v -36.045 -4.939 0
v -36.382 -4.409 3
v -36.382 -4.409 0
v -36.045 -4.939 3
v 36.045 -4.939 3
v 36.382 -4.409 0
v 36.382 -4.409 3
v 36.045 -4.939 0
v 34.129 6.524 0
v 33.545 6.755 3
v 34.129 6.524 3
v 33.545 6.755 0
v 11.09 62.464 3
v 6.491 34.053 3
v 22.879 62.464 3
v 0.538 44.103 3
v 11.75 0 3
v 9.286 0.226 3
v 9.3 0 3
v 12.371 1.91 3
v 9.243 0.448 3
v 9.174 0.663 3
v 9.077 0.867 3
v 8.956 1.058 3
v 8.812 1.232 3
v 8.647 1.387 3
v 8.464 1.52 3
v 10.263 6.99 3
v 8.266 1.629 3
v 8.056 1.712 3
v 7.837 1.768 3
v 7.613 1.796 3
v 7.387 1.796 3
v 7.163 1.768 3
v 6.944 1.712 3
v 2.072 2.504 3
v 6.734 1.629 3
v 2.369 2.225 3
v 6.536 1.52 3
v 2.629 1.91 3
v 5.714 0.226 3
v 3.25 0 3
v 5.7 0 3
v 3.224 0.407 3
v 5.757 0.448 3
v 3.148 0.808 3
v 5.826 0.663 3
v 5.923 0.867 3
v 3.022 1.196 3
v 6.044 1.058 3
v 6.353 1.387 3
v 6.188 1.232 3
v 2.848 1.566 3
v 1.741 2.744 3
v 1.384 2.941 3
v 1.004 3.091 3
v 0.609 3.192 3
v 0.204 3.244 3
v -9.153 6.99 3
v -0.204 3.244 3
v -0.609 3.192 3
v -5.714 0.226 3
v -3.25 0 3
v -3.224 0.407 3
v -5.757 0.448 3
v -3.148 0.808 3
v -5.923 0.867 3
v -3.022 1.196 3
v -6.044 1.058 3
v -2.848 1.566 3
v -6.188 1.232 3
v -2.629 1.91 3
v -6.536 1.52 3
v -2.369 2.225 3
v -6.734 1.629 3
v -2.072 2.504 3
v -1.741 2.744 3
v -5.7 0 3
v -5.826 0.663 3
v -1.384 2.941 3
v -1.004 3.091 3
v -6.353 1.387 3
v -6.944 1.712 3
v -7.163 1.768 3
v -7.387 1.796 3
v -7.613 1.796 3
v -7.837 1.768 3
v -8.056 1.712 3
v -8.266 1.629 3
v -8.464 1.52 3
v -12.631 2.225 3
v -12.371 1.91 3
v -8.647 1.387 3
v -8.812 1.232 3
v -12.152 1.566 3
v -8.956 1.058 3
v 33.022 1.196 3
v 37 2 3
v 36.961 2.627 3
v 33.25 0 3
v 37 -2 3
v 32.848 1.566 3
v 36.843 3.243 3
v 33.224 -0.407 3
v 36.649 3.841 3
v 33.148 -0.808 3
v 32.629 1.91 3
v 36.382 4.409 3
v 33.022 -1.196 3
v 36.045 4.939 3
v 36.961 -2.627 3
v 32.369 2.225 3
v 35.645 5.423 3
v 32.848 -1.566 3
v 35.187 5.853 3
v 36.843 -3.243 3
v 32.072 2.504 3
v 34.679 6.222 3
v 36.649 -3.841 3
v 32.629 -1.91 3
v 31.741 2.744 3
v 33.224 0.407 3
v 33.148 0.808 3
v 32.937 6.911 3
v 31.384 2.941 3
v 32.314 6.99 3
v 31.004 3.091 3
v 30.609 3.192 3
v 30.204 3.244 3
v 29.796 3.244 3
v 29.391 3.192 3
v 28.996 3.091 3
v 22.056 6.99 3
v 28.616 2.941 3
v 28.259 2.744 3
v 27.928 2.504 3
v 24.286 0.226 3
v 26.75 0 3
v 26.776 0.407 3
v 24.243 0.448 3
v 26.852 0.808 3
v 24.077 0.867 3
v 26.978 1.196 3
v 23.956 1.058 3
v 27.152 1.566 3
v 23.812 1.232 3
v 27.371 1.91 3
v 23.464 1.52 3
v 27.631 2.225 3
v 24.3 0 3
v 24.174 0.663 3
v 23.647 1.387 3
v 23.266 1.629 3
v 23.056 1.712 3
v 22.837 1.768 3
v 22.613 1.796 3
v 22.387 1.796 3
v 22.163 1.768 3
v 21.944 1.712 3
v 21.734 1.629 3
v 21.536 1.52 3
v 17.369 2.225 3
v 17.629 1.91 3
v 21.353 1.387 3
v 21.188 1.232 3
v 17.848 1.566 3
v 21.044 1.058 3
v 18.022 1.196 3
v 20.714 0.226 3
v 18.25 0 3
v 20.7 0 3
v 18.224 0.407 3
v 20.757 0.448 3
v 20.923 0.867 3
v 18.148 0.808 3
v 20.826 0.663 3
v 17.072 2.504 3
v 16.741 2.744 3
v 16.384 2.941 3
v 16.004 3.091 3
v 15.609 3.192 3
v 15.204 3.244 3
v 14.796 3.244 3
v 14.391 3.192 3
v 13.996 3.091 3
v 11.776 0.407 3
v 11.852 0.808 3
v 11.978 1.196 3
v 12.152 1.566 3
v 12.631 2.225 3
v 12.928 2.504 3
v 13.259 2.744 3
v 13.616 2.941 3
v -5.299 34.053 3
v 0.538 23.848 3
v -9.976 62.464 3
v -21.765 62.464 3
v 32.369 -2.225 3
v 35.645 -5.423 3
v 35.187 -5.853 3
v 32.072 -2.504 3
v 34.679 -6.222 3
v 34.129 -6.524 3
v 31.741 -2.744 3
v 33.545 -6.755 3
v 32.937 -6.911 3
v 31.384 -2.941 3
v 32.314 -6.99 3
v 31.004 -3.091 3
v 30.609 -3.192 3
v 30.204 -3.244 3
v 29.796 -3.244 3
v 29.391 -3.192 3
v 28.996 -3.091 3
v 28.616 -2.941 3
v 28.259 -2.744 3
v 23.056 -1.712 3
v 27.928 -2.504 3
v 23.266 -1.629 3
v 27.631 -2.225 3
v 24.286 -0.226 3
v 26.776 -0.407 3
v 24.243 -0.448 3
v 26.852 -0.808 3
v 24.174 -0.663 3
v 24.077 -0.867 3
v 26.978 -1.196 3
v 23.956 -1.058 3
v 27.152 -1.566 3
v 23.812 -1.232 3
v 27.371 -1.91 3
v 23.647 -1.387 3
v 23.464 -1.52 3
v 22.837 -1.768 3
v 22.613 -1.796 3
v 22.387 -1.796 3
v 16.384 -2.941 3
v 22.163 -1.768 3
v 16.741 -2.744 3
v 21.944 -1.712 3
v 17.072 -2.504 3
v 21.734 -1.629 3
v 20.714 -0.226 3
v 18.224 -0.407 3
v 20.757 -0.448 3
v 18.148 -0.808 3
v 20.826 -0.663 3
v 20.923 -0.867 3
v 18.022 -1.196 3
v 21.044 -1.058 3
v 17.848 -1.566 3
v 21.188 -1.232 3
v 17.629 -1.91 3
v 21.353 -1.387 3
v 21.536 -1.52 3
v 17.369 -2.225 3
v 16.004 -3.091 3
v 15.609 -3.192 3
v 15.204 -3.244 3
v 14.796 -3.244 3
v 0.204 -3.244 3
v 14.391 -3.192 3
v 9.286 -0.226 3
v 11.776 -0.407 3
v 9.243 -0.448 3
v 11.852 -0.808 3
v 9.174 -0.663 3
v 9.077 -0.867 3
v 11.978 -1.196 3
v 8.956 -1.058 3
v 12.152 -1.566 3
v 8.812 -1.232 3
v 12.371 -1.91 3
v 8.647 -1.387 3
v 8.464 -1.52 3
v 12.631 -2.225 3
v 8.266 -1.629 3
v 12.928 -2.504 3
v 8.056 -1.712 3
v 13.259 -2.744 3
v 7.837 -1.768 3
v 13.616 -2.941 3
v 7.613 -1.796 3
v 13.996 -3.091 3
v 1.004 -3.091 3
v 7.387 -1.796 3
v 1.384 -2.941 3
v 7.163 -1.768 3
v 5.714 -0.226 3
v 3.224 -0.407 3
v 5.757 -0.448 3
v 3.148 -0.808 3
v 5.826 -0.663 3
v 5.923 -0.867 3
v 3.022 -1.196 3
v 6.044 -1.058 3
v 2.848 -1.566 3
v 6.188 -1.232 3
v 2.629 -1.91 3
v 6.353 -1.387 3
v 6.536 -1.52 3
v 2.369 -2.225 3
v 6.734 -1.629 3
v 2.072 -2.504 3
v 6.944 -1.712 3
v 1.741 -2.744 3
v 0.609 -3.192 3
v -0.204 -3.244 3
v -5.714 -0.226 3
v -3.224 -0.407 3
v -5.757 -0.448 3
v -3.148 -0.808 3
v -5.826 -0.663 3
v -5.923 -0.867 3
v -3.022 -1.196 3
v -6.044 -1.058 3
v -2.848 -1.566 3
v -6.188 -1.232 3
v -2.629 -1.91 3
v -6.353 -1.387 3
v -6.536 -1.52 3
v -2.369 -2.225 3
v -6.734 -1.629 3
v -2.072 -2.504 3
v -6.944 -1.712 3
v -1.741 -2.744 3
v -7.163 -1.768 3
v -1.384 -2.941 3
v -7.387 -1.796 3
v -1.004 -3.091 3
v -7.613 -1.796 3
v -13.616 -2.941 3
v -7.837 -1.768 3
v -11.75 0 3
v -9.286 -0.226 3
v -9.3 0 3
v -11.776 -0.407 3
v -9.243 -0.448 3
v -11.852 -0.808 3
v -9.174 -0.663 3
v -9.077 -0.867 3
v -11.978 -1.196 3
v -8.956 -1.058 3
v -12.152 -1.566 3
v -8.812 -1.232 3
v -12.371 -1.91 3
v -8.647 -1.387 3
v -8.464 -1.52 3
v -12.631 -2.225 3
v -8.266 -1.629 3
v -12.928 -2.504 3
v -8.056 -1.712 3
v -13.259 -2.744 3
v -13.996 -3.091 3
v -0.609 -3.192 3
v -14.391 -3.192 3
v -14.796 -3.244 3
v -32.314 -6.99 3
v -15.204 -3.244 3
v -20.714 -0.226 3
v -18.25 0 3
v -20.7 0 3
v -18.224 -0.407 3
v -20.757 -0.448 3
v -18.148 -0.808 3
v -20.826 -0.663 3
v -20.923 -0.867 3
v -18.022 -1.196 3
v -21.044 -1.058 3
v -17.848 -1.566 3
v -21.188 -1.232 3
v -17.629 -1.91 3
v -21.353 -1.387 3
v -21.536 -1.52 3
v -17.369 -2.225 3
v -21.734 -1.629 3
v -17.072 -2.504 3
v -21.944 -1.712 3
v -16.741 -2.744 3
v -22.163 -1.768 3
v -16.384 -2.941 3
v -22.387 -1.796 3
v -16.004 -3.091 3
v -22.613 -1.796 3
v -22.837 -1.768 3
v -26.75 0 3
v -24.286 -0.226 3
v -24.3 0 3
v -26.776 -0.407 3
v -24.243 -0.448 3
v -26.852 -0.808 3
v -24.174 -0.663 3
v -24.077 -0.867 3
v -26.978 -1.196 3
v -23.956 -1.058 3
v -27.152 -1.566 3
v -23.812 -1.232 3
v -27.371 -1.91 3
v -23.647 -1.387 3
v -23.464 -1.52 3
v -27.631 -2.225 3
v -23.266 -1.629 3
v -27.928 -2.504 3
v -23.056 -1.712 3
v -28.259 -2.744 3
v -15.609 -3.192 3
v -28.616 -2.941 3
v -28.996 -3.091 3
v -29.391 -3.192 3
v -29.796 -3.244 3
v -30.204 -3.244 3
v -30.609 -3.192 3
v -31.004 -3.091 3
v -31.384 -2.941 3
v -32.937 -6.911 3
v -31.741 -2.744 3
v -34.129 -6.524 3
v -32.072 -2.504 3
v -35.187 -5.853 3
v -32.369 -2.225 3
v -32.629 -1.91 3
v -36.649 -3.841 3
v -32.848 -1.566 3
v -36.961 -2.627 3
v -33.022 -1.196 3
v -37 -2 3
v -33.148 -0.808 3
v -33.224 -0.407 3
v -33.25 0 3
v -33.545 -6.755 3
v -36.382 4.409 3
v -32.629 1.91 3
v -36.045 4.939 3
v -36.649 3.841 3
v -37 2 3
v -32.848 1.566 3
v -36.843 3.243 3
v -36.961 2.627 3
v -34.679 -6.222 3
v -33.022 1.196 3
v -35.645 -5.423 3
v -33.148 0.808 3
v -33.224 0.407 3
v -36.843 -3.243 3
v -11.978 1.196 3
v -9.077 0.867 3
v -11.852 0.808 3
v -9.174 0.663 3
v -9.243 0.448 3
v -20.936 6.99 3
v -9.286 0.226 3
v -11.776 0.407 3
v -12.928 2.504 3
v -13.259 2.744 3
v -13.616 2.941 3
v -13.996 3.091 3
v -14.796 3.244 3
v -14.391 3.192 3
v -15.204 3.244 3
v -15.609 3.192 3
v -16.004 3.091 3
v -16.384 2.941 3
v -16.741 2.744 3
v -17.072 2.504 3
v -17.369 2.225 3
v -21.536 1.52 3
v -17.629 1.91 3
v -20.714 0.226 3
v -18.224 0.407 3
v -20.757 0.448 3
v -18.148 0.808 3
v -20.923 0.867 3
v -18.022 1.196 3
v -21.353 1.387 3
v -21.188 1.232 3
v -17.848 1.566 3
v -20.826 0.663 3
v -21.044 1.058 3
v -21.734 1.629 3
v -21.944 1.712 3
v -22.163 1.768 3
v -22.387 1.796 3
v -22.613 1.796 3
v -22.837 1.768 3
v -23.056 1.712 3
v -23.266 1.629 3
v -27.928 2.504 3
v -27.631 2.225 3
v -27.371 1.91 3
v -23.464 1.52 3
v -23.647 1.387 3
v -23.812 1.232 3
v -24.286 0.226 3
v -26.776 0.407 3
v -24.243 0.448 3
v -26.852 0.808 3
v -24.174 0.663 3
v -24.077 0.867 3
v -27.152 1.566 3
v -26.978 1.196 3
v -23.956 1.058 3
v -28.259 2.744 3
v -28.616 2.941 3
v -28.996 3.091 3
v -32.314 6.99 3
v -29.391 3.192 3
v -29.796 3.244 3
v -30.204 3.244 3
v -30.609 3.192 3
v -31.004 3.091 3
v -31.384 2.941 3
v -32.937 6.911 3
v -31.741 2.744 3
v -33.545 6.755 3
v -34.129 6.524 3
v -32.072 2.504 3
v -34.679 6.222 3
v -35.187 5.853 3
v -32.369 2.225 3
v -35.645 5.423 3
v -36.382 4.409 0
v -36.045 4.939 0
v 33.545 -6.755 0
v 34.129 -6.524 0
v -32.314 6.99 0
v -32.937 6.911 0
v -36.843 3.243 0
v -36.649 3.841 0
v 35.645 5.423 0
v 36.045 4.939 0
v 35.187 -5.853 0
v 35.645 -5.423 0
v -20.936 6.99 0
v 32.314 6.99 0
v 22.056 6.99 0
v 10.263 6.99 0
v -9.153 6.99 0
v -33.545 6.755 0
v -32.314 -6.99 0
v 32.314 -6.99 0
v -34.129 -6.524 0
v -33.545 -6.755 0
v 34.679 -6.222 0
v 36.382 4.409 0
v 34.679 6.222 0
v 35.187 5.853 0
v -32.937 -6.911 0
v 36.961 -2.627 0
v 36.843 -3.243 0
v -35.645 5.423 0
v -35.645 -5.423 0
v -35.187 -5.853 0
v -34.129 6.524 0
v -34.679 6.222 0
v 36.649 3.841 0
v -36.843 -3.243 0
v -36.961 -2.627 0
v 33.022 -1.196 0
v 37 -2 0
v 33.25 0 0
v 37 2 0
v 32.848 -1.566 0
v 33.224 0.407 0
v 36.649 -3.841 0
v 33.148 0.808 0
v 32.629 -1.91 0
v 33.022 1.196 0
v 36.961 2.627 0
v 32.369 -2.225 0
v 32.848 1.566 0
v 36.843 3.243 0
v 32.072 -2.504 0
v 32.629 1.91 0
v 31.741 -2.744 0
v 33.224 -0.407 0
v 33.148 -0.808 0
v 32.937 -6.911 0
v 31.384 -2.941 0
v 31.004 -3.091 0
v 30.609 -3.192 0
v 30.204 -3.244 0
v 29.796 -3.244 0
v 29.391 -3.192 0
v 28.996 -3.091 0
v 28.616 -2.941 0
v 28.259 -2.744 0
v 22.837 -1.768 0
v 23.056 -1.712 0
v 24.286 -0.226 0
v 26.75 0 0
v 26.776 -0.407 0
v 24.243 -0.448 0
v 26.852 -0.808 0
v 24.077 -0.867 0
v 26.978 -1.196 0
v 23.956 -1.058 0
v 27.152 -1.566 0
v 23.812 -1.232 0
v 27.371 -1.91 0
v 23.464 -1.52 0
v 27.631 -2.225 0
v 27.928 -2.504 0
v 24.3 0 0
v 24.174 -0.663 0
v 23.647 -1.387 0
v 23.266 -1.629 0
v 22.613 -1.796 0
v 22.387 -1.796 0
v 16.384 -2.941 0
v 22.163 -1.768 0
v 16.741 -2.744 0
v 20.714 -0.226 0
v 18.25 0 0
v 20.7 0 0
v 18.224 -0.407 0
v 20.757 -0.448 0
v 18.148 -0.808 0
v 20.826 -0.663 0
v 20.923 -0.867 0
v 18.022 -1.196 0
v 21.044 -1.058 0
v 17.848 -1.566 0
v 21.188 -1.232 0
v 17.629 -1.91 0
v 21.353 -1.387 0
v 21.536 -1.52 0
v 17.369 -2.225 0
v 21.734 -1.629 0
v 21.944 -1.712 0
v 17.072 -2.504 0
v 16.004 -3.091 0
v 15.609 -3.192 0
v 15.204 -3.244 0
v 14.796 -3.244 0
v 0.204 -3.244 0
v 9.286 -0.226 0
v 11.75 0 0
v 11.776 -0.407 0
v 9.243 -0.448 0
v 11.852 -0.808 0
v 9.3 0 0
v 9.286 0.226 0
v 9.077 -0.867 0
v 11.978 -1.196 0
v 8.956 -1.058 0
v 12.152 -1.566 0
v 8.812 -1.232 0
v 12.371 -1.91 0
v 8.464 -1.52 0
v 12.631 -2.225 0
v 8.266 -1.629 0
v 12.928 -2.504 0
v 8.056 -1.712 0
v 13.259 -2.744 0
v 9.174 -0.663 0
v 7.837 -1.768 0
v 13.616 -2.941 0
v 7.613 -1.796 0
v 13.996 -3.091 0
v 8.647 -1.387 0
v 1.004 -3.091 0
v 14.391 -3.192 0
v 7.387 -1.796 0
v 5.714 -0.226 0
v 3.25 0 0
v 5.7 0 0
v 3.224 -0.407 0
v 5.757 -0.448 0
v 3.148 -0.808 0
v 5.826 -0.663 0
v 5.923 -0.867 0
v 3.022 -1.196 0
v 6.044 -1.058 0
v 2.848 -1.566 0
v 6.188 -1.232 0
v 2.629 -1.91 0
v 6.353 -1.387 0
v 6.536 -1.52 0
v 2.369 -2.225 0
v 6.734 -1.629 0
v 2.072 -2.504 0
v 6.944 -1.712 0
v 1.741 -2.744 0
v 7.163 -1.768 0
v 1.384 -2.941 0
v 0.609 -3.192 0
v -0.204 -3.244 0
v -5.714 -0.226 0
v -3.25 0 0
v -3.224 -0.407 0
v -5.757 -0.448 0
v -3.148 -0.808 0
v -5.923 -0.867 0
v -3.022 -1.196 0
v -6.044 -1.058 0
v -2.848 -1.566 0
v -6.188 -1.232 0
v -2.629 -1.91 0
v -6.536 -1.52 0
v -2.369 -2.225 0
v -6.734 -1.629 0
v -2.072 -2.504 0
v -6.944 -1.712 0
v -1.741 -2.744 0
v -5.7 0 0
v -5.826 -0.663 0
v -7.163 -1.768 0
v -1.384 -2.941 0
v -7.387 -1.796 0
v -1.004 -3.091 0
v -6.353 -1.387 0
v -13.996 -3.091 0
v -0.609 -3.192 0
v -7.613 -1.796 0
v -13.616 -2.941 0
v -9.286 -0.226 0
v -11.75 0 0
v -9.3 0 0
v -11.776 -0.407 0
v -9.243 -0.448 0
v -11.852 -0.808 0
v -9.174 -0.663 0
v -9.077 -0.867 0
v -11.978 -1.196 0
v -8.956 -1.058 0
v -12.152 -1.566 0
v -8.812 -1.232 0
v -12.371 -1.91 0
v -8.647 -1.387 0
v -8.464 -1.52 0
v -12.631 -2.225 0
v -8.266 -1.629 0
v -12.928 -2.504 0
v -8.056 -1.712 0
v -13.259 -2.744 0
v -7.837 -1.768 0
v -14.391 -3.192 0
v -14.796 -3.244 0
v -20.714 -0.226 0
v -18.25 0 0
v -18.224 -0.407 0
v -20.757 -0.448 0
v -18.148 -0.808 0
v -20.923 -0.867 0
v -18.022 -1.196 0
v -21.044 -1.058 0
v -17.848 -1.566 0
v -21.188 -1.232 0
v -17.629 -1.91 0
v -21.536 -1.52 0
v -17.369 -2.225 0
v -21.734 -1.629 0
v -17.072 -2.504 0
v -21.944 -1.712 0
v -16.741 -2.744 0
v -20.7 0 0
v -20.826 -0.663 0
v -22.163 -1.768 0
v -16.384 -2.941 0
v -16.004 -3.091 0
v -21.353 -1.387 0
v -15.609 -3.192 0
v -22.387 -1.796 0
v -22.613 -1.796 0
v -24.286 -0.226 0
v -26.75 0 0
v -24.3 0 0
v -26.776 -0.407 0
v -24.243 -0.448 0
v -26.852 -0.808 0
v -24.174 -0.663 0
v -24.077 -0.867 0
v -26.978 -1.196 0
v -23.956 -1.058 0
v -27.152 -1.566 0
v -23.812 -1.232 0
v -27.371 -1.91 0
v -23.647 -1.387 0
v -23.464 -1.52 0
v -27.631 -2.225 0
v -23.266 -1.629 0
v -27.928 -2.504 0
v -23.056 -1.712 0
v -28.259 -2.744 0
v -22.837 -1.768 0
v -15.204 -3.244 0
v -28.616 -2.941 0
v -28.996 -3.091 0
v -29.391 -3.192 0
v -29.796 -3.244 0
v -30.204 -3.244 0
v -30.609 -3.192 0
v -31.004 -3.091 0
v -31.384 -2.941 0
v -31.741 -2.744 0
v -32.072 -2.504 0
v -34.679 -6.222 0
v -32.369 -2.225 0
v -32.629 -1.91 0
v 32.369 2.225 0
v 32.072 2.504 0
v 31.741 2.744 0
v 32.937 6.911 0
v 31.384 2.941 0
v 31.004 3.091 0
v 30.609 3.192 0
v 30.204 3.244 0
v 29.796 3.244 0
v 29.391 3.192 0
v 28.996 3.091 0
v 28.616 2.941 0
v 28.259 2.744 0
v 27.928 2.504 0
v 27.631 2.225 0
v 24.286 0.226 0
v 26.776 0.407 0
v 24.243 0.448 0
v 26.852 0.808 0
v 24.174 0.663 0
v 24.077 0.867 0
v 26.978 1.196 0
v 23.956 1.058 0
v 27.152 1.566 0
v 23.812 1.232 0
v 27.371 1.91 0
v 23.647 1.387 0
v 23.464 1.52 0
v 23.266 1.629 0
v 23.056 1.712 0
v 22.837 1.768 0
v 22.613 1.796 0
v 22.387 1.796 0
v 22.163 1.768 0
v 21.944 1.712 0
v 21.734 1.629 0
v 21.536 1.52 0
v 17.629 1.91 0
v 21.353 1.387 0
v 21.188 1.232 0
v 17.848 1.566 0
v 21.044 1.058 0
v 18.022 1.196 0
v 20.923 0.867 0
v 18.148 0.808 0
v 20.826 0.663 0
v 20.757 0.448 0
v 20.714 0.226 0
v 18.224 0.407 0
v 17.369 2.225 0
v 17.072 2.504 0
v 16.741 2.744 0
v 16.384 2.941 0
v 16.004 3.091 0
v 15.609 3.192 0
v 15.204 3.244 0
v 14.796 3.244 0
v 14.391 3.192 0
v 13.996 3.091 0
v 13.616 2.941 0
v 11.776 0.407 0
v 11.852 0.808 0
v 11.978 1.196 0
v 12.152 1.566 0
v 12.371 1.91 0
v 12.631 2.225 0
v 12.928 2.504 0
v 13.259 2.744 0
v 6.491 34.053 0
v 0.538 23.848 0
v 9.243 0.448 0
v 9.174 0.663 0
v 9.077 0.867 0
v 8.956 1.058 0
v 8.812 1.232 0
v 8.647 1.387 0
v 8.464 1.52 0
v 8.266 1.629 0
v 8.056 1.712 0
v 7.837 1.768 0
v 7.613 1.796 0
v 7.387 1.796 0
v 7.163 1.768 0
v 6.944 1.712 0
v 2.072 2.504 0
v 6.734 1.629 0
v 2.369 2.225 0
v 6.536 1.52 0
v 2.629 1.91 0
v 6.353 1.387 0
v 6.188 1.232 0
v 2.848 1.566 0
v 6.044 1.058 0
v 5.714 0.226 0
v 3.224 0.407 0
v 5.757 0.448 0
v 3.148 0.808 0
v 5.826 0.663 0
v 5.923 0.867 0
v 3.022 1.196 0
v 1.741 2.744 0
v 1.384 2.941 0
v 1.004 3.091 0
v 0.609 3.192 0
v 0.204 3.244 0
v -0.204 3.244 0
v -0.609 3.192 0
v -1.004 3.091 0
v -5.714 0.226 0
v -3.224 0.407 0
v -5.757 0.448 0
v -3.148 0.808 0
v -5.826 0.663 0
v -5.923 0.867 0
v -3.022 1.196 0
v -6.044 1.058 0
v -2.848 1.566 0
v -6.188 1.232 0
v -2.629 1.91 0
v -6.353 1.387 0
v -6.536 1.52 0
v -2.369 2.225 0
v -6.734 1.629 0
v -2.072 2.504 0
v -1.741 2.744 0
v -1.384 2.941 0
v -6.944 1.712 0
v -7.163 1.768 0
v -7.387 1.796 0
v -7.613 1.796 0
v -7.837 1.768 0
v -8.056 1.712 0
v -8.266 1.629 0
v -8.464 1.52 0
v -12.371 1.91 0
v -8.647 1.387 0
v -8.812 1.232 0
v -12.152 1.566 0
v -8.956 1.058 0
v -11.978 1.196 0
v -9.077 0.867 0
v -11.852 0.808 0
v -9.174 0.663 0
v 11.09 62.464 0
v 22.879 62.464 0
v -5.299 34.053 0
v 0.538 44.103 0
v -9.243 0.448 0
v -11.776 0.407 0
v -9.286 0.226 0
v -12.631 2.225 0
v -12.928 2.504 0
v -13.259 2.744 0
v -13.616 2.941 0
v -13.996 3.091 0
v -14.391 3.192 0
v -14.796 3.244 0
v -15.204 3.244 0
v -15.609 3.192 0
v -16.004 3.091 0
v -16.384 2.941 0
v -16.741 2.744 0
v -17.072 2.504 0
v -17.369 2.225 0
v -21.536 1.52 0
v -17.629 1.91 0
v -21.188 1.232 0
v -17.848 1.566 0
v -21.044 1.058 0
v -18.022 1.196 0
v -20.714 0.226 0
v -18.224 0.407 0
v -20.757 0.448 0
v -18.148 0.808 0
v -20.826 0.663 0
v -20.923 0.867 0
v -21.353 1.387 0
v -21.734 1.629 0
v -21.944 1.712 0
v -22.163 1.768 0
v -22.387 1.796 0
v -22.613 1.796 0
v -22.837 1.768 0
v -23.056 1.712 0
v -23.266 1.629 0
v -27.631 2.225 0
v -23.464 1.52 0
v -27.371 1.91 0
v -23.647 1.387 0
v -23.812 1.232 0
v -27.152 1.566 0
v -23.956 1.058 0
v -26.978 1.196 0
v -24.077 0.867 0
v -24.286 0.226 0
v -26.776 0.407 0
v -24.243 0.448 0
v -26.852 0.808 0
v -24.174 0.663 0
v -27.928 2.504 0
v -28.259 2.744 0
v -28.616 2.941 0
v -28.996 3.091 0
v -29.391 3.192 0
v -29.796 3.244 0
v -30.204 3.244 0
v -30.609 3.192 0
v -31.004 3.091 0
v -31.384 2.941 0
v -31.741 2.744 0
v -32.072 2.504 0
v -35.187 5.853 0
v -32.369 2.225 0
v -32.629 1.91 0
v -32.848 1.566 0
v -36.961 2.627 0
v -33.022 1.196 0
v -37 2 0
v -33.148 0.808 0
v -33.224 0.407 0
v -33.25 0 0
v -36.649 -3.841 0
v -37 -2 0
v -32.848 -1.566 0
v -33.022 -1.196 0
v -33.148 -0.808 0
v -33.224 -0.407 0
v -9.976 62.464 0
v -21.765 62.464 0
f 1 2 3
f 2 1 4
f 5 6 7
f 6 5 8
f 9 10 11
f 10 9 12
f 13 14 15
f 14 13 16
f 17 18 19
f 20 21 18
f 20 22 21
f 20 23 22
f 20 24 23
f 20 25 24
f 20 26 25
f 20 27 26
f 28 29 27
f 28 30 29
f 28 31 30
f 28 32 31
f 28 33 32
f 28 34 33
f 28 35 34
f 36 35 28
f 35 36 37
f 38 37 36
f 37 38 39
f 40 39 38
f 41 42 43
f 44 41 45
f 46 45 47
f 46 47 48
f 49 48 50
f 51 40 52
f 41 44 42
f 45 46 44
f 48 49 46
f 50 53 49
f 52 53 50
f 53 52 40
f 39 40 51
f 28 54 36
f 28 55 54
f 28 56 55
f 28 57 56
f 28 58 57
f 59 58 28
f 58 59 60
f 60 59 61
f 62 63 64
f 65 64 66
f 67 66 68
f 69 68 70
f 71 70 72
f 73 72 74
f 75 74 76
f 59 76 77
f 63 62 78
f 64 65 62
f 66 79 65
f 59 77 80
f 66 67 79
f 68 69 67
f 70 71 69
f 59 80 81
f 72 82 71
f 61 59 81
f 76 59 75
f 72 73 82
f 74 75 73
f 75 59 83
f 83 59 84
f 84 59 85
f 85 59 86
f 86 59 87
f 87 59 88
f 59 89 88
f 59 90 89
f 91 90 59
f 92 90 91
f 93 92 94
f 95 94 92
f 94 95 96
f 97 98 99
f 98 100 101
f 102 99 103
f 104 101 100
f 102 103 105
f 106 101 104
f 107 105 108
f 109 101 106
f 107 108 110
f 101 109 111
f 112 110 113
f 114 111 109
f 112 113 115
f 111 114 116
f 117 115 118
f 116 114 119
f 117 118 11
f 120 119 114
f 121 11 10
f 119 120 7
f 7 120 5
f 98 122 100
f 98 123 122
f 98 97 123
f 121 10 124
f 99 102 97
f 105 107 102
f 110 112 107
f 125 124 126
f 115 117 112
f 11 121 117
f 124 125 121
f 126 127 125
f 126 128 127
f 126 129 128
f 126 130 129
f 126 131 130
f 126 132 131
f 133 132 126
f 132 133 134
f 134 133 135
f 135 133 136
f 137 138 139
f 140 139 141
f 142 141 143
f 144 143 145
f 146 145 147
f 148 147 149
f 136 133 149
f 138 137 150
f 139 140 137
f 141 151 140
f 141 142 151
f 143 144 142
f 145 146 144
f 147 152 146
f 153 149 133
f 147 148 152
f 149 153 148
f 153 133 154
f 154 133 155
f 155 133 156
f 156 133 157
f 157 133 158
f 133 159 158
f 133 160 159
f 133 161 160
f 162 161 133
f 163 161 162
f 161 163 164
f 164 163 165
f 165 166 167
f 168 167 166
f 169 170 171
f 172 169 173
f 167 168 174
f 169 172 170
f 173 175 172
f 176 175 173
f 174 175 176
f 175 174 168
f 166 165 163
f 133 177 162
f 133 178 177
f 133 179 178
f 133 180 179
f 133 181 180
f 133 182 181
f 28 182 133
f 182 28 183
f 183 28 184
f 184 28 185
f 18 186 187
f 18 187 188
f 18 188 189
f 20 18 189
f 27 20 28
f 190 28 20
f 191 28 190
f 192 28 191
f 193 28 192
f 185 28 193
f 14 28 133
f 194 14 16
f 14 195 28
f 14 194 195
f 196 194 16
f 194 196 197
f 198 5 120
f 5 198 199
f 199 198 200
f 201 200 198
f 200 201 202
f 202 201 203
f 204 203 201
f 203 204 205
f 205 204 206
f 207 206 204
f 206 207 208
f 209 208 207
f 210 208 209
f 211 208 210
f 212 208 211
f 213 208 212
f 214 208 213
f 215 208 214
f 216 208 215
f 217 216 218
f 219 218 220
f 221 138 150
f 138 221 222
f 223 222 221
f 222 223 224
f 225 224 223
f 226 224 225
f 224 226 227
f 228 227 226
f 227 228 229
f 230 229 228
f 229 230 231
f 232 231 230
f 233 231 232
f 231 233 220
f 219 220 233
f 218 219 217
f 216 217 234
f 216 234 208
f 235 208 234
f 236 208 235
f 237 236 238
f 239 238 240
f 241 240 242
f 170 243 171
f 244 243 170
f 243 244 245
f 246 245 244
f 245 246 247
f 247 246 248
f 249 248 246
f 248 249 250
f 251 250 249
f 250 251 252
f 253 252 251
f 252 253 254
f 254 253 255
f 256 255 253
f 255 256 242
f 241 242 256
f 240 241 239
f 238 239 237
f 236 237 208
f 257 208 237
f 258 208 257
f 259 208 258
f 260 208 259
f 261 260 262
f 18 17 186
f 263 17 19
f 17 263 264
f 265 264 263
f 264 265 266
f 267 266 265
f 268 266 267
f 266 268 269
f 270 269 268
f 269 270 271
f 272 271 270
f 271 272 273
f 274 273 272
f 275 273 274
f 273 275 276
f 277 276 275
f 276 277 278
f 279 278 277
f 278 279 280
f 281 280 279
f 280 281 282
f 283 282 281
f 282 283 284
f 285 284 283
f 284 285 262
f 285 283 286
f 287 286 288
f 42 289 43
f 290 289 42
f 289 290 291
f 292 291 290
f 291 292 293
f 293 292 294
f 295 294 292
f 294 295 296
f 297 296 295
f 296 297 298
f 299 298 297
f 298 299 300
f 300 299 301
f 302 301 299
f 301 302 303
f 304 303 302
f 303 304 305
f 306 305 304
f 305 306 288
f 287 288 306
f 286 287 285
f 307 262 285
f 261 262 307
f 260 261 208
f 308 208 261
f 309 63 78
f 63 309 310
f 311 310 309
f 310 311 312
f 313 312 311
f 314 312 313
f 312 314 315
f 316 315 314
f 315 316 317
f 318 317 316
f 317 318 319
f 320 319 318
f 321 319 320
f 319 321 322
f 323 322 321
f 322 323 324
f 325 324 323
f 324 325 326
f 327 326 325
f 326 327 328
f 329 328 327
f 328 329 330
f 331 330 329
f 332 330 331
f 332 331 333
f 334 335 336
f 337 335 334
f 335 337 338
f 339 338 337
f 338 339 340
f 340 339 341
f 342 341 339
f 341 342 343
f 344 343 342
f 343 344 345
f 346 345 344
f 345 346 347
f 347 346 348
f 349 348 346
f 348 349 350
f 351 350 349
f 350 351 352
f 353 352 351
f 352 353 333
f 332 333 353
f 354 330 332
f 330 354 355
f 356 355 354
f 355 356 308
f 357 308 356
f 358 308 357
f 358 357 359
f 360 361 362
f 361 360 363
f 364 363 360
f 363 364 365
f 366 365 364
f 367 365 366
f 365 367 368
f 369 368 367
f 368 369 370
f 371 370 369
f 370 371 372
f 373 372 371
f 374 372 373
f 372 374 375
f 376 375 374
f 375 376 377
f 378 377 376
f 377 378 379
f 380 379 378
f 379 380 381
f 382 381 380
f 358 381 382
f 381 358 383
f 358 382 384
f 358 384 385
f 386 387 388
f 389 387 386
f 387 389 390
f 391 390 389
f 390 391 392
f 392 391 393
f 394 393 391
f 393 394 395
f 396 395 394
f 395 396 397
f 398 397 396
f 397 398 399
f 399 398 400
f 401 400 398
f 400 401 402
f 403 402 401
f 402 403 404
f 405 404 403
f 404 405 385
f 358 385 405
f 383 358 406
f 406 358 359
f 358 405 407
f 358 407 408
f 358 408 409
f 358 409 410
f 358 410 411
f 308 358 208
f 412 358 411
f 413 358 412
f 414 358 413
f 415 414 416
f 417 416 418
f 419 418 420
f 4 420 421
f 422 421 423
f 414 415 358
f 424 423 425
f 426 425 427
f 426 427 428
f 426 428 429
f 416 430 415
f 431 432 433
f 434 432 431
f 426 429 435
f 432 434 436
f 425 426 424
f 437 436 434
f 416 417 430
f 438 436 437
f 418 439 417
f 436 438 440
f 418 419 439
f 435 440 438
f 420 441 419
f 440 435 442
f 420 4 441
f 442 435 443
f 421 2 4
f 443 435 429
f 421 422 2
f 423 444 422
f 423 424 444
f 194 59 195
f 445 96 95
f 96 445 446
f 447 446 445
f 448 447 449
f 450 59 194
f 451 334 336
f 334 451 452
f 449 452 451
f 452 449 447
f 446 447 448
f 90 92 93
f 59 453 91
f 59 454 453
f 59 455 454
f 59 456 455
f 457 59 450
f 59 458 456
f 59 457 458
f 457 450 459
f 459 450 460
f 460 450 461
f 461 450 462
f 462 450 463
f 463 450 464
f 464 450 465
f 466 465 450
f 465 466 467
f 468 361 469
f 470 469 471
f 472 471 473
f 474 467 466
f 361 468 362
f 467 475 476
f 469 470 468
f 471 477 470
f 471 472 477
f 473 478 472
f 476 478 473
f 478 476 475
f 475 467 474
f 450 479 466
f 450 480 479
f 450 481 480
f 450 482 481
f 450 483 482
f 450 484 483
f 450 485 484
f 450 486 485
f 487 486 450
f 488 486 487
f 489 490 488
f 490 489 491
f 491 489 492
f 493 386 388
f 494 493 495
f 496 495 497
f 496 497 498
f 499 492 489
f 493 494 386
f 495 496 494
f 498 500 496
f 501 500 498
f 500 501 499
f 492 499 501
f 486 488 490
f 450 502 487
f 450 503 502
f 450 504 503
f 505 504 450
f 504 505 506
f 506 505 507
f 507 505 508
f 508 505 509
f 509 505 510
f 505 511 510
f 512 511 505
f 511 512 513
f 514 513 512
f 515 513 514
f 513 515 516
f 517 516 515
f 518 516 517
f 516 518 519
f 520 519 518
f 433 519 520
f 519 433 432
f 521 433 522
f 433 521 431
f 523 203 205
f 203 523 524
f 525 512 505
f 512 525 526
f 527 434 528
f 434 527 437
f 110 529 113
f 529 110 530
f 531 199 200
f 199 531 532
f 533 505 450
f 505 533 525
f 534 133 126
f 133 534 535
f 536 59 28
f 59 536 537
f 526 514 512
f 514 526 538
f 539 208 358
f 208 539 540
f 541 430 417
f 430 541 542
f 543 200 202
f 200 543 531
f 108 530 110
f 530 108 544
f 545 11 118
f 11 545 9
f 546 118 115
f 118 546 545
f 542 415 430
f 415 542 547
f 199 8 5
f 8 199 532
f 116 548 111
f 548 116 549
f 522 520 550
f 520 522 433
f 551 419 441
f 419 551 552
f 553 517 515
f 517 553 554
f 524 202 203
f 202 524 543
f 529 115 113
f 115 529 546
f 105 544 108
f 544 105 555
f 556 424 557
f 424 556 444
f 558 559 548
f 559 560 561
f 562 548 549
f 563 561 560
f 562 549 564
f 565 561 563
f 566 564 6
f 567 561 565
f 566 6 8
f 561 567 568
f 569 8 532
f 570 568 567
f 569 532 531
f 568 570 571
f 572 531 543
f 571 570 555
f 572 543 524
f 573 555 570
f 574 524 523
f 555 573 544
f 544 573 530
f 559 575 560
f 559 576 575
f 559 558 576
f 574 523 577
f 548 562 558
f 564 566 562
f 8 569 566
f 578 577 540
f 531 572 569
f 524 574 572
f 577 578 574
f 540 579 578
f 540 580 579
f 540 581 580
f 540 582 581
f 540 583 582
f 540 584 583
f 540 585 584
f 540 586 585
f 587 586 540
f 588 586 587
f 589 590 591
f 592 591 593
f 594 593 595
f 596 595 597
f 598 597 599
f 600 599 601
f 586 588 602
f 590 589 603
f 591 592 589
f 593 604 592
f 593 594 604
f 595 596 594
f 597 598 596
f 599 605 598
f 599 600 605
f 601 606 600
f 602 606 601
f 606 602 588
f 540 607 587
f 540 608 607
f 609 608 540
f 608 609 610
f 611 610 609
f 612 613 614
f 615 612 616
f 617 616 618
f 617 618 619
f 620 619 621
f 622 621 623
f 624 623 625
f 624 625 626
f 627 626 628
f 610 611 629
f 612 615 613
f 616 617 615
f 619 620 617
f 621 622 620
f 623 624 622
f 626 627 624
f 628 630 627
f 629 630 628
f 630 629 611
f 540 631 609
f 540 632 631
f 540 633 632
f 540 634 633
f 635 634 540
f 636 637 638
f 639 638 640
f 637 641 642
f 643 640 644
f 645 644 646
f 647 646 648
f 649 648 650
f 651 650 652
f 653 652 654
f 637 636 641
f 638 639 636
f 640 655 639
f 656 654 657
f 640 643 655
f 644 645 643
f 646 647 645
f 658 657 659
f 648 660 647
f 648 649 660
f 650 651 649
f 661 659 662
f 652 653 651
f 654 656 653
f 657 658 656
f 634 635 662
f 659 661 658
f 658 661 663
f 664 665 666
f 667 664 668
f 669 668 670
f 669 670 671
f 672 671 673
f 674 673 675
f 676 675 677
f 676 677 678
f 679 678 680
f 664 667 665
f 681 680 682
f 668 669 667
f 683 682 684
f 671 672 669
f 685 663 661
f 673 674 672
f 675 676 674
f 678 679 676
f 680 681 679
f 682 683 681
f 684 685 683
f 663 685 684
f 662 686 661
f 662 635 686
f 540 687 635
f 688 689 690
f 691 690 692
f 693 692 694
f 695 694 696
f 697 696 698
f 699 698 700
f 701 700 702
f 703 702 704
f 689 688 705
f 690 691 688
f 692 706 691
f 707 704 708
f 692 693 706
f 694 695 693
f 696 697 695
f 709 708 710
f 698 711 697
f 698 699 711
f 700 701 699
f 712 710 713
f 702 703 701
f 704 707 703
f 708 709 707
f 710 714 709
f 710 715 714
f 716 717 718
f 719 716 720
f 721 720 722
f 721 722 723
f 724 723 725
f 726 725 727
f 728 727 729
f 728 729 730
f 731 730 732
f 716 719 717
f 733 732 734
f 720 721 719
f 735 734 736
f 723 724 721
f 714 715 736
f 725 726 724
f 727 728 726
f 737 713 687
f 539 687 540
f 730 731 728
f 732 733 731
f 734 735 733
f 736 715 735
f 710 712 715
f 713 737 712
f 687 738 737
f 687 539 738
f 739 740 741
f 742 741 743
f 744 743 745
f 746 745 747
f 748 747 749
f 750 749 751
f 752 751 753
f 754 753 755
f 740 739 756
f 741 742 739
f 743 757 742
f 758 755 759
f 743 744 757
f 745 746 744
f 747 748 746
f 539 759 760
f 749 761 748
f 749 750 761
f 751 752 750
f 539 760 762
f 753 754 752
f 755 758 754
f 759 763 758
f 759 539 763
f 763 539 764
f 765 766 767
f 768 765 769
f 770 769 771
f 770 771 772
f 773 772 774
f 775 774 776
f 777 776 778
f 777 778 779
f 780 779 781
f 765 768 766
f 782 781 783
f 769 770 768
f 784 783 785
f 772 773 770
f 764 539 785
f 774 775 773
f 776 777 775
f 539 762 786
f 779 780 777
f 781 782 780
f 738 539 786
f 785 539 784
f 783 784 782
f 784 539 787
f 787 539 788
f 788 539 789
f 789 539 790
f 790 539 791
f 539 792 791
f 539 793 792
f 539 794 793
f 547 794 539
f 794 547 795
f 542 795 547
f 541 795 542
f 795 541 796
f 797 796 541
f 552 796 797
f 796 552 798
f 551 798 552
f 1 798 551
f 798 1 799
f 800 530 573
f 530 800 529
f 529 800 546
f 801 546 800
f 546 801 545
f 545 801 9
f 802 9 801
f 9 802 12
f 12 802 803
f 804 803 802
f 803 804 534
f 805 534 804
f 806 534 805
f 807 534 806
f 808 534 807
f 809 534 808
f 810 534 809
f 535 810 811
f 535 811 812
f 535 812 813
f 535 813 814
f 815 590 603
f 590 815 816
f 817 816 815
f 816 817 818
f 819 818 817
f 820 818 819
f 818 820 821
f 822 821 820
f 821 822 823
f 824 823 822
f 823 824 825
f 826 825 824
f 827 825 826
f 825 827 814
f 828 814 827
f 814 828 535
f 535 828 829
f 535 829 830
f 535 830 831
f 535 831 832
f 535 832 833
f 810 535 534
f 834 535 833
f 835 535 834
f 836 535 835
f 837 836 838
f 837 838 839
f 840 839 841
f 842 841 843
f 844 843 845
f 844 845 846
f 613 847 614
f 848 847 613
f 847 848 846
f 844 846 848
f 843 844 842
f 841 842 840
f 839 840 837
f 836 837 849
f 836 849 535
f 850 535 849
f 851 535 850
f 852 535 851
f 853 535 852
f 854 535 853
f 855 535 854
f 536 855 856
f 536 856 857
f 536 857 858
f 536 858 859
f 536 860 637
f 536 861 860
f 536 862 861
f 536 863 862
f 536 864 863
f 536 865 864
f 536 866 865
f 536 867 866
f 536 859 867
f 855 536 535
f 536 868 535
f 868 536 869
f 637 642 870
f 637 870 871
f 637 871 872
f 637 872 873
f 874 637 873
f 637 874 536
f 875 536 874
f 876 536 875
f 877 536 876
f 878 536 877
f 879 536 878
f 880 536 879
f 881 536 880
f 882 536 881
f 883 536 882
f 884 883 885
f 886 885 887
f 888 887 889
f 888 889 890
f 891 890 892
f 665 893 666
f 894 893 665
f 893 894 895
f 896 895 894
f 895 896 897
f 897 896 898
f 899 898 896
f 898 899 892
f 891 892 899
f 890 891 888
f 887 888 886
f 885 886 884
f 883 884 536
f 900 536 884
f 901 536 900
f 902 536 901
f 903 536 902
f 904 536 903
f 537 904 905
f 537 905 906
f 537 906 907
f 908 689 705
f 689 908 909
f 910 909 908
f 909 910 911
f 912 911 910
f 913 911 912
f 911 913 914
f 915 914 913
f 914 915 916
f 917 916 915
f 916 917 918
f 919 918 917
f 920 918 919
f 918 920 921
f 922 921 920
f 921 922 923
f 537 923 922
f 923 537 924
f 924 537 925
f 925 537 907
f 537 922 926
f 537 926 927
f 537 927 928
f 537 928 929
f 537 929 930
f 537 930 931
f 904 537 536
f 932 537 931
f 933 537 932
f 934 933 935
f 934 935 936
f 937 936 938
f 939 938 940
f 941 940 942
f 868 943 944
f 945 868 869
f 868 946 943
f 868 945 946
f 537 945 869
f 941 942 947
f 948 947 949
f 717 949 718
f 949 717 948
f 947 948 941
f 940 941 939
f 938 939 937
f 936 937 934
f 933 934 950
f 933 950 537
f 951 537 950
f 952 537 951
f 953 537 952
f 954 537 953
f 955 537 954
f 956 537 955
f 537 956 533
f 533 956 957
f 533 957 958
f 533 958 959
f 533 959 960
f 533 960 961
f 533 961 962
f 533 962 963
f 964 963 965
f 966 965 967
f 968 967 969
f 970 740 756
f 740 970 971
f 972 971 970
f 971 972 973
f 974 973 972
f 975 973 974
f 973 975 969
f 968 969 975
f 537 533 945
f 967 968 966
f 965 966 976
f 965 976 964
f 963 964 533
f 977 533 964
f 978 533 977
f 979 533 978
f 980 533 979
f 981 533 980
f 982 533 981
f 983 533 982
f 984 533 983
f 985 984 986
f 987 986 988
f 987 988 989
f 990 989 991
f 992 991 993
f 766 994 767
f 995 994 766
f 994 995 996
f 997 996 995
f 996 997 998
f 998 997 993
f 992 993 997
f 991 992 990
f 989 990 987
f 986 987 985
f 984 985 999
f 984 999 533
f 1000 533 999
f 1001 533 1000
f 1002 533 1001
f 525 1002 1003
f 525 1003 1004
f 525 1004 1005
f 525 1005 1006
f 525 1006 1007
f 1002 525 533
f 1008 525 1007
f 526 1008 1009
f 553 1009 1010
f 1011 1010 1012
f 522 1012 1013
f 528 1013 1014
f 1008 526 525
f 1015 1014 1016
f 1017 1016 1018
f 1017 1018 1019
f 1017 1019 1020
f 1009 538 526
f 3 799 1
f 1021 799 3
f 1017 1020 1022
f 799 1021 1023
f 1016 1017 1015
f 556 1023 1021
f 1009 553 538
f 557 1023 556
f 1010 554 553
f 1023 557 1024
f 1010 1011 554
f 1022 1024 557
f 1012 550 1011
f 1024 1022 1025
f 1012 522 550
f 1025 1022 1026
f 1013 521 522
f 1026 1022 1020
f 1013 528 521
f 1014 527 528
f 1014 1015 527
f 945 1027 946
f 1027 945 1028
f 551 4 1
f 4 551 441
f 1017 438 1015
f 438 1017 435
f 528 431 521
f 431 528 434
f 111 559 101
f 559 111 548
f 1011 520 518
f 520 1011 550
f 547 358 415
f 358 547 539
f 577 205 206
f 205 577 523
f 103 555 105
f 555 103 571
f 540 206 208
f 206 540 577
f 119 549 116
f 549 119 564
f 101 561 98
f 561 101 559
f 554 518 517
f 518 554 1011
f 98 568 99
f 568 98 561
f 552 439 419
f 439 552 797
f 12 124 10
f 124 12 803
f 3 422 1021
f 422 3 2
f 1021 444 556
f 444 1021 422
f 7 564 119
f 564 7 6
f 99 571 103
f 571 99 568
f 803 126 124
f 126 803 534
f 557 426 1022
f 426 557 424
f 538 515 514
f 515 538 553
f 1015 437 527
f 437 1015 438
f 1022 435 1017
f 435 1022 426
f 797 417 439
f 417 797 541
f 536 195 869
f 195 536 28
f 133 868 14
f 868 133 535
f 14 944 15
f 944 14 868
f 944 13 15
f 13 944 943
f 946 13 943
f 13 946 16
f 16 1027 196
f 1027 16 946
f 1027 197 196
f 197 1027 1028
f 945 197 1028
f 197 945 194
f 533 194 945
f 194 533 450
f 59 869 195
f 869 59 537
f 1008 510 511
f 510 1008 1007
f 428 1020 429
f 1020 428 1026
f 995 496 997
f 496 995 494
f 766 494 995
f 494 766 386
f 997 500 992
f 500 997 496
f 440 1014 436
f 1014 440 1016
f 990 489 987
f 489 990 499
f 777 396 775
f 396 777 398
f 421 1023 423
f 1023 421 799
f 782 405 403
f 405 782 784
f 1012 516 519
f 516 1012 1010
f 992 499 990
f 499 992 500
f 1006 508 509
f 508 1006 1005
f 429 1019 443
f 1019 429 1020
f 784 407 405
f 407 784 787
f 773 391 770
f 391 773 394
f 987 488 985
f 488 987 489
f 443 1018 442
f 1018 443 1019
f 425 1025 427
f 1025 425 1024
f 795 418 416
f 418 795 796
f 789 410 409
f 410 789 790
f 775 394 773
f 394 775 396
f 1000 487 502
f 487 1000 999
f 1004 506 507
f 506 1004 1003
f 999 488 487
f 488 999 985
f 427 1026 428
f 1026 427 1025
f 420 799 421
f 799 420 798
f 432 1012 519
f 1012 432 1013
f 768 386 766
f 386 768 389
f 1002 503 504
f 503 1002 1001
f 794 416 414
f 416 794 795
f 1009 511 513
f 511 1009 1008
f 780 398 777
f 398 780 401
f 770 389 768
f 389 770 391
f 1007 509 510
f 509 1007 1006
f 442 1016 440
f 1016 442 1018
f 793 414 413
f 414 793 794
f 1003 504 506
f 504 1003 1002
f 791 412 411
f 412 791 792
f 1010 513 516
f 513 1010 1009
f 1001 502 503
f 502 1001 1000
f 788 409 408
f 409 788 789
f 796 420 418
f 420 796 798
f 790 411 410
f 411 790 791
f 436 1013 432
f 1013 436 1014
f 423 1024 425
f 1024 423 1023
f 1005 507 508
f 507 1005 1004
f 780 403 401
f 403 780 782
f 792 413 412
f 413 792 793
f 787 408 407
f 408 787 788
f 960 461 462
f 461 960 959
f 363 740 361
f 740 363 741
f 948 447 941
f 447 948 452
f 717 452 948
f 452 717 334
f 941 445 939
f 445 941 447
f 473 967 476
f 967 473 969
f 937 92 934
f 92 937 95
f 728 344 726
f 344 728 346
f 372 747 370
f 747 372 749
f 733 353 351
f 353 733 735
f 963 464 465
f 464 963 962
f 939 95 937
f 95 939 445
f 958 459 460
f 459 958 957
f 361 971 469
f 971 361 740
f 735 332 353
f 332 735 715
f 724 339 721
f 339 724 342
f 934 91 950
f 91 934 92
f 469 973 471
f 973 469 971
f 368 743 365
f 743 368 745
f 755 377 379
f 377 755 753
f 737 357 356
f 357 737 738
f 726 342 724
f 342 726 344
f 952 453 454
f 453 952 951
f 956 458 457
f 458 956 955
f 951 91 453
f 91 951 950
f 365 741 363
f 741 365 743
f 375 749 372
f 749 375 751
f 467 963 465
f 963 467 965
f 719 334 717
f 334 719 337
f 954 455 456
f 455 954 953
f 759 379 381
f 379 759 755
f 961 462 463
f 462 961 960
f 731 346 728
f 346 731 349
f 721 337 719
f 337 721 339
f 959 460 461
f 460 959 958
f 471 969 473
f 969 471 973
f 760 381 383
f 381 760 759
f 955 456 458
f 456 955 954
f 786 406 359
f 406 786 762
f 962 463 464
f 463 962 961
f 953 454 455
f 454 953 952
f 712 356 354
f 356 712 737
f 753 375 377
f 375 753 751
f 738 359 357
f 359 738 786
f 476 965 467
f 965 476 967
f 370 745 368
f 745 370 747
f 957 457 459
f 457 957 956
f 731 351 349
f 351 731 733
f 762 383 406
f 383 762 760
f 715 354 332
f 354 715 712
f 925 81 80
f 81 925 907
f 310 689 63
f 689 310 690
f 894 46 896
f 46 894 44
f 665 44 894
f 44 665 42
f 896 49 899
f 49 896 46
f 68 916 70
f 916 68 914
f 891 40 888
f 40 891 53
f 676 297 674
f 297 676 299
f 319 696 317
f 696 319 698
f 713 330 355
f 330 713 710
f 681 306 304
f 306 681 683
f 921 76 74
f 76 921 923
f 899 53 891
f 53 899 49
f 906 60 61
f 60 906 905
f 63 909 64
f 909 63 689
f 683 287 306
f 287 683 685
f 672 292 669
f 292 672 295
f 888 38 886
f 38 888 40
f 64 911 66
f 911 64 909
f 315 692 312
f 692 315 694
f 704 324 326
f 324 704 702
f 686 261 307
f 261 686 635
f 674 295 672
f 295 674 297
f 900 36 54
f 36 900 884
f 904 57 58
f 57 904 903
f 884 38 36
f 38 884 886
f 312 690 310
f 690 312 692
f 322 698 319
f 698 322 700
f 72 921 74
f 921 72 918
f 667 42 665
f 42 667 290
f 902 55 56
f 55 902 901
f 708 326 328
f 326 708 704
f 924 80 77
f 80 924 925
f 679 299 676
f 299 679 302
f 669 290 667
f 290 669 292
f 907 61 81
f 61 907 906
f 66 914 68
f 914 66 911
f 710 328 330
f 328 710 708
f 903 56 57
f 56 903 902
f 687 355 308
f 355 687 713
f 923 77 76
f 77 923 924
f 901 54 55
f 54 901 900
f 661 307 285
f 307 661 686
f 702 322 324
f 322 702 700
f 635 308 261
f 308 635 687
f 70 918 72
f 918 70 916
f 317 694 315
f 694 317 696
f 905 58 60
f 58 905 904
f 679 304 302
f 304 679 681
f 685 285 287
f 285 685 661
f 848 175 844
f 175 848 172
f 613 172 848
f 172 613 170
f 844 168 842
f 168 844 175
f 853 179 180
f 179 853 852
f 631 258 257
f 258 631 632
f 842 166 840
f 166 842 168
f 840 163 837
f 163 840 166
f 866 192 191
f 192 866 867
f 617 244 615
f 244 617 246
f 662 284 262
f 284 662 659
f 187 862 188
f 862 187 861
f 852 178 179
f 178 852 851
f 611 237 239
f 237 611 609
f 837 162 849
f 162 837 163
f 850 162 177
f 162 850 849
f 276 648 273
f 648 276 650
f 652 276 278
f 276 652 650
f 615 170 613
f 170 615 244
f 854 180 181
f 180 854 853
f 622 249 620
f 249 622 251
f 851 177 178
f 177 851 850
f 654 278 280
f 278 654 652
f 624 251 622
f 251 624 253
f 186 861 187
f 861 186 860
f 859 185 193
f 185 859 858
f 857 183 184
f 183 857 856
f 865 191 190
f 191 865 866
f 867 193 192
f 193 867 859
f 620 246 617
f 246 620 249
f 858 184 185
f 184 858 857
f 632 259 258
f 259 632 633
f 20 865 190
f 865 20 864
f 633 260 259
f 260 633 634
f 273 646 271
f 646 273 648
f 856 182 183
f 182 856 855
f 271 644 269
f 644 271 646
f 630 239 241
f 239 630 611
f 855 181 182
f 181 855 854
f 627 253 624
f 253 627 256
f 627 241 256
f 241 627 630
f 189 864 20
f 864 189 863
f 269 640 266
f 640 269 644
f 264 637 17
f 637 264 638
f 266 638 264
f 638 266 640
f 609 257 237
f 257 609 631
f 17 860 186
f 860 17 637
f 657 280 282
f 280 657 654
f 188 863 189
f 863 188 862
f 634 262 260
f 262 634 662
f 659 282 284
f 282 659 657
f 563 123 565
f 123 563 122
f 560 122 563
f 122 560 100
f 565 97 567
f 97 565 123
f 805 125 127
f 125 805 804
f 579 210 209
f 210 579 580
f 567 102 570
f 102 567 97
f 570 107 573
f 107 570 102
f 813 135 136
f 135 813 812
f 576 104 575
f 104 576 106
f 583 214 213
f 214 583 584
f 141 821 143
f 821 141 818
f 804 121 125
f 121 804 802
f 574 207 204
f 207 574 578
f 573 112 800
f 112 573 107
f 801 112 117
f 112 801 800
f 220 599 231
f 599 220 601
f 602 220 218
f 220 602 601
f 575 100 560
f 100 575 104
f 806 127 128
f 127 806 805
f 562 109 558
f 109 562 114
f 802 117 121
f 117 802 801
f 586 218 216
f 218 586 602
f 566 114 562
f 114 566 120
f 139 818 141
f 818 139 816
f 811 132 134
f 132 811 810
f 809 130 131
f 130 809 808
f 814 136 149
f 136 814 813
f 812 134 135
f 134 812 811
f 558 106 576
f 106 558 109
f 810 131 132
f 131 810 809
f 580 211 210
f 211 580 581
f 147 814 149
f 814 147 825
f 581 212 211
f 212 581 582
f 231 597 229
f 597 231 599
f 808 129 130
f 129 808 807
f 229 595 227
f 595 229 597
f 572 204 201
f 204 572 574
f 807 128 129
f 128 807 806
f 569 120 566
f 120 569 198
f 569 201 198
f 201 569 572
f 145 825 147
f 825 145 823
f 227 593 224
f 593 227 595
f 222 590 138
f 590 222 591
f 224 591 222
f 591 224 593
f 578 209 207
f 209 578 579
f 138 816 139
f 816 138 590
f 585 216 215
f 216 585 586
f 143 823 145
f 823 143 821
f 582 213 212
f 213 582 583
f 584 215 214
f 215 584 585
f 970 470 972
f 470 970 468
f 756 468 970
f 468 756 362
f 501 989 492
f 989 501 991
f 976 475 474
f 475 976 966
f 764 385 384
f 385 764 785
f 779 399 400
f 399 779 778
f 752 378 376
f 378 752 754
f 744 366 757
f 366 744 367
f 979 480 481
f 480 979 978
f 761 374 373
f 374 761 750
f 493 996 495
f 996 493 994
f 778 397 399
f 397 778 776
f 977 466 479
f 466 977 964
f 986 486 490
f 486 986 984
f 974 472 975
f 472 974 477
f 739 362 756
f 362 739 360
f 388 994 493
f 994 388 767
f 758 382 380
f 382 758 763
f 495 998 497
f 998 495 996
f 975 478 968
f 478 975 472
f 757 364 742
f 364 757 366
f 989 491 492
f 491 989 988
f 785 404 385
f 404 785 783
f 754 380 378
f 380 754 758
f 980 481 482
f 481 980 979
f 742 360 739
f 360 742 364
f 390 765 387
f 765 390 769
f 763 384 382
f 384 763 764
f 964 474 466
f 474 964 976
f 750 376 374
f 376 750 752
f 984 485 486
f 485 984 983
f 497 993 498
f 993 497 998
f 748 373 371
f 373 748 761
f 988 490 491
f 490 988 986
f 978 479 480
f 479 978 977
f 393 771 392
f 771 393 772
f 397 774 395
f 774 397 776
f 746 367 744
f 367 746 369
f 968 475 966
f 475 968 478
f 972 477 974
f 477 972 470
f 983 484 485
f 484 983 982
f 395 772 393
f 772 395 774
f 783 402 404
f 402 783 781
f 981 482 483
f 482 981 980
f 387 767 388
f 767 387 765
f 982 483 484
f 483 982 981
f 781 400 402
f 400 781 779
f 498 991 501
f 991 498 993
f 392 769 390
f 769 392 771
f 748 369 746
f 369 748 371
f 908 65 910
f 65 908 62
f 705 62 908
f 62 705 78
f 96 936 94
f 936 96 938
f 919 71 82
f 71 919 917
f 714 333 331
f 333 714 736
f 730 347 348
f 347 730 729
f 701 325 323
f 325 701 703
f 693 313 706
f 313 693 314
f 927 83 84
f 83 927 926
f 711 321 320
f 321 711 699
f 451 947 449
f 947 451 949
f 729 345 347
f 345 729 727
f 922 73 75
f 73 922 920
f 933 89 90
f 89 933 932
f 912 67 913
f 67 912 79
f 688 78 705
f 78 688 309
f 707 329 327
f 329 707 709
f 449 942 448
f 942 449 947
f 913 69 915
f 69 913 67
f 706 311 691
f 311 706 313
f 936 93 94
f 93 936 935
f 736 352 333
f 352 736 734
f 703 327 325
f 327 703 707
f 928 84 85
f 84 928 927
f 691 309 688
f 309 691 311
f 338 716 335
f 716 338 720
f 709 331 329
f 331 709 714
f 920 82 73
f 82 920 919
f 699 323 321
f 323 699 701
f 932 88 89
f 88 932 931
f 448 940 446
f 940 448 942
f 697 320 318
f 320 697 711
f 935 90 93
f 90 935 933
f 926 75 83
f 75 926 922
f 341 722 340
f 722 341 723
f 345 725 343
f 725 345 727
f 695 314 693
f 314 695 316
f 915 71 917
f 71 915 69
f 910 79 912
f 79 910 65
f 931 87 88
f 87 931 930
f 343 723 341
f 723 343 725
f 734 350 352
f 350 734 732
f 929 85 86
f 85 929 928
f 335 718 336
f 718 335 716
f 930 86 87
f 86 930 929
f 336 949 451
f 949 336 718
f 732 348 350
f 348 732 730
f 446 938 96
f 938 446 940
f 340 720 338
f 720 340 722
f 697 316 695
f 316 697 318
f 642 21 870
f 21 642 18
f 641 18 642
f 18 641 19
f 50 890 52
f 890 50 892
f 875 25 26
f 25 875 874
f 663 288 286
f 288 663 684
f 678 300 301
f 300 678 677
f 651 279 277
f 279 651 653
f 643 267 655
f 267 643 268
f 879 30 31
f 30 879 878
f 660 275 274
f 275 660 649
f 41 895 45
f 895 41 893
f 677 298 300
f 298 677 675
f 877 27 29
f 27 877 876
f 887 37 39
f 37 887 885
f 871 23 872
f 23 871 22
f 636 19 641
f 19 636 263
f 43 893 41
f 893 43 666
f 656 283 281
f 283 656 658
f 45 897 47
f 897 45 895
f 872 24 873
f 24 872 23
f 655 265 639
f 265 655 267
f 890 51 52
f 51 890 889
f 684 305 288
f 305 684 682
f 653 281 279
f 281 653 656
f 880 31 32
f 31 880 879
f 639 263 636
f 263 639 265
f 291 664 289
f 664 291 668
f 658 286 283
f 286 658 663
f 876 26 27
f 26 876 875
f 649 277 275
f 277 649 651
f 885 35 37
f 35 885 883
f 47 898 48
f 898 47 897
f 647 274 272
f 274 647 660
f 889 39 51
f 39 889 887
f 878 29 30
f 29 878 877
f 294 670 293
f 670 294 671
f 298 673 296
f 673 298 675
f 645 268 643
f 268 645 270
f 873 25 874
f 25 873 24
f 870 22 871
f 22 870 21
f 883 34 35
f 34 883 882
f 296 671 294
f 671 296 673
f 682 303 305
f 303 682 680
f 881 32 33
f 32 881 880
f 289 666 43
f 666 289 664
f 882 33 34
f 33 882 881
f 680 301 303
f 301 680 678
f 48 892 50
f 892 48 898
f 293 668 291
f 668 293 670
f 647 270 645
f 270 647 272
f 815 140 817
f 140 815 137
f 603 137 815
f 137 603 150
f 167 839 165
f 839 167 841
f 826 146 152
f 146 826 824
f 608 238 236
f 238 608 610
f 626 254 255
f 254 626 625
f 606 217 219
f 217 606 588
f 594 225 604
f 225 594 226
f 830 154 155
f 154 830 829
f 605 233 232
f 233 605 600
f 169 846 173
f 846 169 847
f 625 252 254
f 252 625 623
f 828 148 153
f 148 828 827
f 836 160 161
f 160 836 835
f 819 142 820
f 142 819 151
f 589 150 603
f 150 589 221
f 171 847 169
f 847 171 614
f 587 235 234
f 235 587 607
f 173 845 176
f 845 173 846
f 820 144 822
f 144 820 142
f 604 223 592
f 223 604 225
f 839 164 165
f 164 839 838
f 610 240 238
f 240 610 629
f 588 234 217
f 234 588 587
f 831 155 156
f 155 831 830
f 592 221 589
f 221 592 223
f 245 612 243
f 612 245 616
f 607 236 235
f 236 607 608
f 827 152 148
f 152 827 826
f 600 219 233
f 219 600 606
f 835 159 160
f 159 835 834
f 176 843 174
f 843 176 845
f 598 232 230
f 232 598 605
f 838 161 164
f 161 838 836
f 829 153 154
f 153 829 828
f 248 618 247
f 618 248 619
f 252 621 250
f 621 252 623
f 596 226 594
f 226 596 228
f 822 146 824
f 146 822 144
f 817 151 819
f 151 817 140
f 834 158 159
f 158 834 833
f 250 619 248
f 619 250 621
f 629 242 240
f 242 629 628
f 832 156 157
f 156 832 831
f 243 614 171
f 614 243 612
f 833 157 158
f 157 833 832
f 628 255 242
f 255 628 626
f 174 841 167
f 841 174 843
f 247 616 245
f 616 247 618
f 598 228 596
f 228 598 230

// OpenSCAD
$fn = 50;


difference() {
	union() {
		hull() {
			translate(v = [-32.0000000000, 2.0000000000, 0]) {
				cylinder(h = 3, r = 5);
			}
			translate(v = [32.0000000000, 2.0000000000, 0]) {
				cylinder(h = 3, r = 5);
			}
			translate(v = [-32.0000000000, -2.0000000000, 0]) {
				cylinder(h = 3, r = 5);
			}
			translate(v = [32.0000000000, -2.0000000000, 0]) {
				cylinder(h = 3, r = 5);
			}
		}
		translate(v = [0, 61.1111111111, 0]) {
			linear_extrude(height = 3) {
				text(font = "DejaVu Sans Mono:style=Bold", halign = "center", size = 57.0000000000, text = "X", valign = "top");
			}
		}
	}
	union() {
		translate(v = [-30.0000000000, 0.0000000000, 0]) {
			translate(v = [0, 0, -100]) {
				cylinder(h = 200, r = 3.2500000000);
			}
		}
		translate(v = [-15.0000000000, 0.0000000000, 0]) {
			translate(v = [0, 0, -100]) {
				cylinder(h = 200, r = 3.2500000000);
			}
		}
		translate(v = [0, 0, -100]) {
			cylinder(h = 200, r = 3.2500000000);
		}
		translate(v = [15.0000000000, 0.0000000000, 0]) {
			translate(v = [0, 0, -100]) {
				cylinder(h = 200, r = 3.2500000000);
			}
		}
		translate(v = [30.0000000000, 0.0000000000, 0]) {
			translate(v = [0, 0, -100]) {
				cylinder(h = 200, r = 3.2500000000);
			}
		}
		translate(v = [-30.0000000000, 0.0000000000, 0]) {
			translate(v = [0, 0, -100]) {
				cylinder(h = 200, r = 1.8000000000);
			}
		}
		translate(v = [-22.5000000000, 0.0000000000, 0]) {
			translate(v = [0, 0, -100]) {
				cylinder(h = 200, r = 1.8000000000);
			}
		}
		translate(v = [-15.0000000000, 0.0000000000, 0]) {
			translate(v = [0, 0, -100]) {
				cylinder(h = 200, r = 1.8000000000);
			}
		}
		translate(v = [-7.5000000000, 0.0000000000, 0]) {
			translate(v = [0, 0, -100]) {
				cylinder(h = 200, r = 1.8000000000);
			}
		}
		translate(v = [0, 0, -100]) {
			cylinder(h = 200, r = 1.8000000000);
		}
		translate(v = [7.5000000000, 0.0000000000, 0]) {
			translate(v = [0, 0, -100]) {
				cylinder(h = 200, r = 1.8000000000);
			}
		}
		translate(v = [15.0000000000, 0.0000000000, 0]) {
			translate(v = [0, 0, -100]) {
				cylinder(h = 200, r = 1.8000000000);
			}
		}
		translate(v = [22.5000000000, 0.0000000000, 0]) {
			translate(v = [0, 0, -100]) {
				cylinder(h = 200, r = 1.8000000000);
			}
		}
		translate(v = [30.0000000000, 0.0000000000, 0]) {
			translate(v = [0, 0, -100]) {
				cylinder(h = 200, r = 1.8000000000);
			}
		}
	}
}
